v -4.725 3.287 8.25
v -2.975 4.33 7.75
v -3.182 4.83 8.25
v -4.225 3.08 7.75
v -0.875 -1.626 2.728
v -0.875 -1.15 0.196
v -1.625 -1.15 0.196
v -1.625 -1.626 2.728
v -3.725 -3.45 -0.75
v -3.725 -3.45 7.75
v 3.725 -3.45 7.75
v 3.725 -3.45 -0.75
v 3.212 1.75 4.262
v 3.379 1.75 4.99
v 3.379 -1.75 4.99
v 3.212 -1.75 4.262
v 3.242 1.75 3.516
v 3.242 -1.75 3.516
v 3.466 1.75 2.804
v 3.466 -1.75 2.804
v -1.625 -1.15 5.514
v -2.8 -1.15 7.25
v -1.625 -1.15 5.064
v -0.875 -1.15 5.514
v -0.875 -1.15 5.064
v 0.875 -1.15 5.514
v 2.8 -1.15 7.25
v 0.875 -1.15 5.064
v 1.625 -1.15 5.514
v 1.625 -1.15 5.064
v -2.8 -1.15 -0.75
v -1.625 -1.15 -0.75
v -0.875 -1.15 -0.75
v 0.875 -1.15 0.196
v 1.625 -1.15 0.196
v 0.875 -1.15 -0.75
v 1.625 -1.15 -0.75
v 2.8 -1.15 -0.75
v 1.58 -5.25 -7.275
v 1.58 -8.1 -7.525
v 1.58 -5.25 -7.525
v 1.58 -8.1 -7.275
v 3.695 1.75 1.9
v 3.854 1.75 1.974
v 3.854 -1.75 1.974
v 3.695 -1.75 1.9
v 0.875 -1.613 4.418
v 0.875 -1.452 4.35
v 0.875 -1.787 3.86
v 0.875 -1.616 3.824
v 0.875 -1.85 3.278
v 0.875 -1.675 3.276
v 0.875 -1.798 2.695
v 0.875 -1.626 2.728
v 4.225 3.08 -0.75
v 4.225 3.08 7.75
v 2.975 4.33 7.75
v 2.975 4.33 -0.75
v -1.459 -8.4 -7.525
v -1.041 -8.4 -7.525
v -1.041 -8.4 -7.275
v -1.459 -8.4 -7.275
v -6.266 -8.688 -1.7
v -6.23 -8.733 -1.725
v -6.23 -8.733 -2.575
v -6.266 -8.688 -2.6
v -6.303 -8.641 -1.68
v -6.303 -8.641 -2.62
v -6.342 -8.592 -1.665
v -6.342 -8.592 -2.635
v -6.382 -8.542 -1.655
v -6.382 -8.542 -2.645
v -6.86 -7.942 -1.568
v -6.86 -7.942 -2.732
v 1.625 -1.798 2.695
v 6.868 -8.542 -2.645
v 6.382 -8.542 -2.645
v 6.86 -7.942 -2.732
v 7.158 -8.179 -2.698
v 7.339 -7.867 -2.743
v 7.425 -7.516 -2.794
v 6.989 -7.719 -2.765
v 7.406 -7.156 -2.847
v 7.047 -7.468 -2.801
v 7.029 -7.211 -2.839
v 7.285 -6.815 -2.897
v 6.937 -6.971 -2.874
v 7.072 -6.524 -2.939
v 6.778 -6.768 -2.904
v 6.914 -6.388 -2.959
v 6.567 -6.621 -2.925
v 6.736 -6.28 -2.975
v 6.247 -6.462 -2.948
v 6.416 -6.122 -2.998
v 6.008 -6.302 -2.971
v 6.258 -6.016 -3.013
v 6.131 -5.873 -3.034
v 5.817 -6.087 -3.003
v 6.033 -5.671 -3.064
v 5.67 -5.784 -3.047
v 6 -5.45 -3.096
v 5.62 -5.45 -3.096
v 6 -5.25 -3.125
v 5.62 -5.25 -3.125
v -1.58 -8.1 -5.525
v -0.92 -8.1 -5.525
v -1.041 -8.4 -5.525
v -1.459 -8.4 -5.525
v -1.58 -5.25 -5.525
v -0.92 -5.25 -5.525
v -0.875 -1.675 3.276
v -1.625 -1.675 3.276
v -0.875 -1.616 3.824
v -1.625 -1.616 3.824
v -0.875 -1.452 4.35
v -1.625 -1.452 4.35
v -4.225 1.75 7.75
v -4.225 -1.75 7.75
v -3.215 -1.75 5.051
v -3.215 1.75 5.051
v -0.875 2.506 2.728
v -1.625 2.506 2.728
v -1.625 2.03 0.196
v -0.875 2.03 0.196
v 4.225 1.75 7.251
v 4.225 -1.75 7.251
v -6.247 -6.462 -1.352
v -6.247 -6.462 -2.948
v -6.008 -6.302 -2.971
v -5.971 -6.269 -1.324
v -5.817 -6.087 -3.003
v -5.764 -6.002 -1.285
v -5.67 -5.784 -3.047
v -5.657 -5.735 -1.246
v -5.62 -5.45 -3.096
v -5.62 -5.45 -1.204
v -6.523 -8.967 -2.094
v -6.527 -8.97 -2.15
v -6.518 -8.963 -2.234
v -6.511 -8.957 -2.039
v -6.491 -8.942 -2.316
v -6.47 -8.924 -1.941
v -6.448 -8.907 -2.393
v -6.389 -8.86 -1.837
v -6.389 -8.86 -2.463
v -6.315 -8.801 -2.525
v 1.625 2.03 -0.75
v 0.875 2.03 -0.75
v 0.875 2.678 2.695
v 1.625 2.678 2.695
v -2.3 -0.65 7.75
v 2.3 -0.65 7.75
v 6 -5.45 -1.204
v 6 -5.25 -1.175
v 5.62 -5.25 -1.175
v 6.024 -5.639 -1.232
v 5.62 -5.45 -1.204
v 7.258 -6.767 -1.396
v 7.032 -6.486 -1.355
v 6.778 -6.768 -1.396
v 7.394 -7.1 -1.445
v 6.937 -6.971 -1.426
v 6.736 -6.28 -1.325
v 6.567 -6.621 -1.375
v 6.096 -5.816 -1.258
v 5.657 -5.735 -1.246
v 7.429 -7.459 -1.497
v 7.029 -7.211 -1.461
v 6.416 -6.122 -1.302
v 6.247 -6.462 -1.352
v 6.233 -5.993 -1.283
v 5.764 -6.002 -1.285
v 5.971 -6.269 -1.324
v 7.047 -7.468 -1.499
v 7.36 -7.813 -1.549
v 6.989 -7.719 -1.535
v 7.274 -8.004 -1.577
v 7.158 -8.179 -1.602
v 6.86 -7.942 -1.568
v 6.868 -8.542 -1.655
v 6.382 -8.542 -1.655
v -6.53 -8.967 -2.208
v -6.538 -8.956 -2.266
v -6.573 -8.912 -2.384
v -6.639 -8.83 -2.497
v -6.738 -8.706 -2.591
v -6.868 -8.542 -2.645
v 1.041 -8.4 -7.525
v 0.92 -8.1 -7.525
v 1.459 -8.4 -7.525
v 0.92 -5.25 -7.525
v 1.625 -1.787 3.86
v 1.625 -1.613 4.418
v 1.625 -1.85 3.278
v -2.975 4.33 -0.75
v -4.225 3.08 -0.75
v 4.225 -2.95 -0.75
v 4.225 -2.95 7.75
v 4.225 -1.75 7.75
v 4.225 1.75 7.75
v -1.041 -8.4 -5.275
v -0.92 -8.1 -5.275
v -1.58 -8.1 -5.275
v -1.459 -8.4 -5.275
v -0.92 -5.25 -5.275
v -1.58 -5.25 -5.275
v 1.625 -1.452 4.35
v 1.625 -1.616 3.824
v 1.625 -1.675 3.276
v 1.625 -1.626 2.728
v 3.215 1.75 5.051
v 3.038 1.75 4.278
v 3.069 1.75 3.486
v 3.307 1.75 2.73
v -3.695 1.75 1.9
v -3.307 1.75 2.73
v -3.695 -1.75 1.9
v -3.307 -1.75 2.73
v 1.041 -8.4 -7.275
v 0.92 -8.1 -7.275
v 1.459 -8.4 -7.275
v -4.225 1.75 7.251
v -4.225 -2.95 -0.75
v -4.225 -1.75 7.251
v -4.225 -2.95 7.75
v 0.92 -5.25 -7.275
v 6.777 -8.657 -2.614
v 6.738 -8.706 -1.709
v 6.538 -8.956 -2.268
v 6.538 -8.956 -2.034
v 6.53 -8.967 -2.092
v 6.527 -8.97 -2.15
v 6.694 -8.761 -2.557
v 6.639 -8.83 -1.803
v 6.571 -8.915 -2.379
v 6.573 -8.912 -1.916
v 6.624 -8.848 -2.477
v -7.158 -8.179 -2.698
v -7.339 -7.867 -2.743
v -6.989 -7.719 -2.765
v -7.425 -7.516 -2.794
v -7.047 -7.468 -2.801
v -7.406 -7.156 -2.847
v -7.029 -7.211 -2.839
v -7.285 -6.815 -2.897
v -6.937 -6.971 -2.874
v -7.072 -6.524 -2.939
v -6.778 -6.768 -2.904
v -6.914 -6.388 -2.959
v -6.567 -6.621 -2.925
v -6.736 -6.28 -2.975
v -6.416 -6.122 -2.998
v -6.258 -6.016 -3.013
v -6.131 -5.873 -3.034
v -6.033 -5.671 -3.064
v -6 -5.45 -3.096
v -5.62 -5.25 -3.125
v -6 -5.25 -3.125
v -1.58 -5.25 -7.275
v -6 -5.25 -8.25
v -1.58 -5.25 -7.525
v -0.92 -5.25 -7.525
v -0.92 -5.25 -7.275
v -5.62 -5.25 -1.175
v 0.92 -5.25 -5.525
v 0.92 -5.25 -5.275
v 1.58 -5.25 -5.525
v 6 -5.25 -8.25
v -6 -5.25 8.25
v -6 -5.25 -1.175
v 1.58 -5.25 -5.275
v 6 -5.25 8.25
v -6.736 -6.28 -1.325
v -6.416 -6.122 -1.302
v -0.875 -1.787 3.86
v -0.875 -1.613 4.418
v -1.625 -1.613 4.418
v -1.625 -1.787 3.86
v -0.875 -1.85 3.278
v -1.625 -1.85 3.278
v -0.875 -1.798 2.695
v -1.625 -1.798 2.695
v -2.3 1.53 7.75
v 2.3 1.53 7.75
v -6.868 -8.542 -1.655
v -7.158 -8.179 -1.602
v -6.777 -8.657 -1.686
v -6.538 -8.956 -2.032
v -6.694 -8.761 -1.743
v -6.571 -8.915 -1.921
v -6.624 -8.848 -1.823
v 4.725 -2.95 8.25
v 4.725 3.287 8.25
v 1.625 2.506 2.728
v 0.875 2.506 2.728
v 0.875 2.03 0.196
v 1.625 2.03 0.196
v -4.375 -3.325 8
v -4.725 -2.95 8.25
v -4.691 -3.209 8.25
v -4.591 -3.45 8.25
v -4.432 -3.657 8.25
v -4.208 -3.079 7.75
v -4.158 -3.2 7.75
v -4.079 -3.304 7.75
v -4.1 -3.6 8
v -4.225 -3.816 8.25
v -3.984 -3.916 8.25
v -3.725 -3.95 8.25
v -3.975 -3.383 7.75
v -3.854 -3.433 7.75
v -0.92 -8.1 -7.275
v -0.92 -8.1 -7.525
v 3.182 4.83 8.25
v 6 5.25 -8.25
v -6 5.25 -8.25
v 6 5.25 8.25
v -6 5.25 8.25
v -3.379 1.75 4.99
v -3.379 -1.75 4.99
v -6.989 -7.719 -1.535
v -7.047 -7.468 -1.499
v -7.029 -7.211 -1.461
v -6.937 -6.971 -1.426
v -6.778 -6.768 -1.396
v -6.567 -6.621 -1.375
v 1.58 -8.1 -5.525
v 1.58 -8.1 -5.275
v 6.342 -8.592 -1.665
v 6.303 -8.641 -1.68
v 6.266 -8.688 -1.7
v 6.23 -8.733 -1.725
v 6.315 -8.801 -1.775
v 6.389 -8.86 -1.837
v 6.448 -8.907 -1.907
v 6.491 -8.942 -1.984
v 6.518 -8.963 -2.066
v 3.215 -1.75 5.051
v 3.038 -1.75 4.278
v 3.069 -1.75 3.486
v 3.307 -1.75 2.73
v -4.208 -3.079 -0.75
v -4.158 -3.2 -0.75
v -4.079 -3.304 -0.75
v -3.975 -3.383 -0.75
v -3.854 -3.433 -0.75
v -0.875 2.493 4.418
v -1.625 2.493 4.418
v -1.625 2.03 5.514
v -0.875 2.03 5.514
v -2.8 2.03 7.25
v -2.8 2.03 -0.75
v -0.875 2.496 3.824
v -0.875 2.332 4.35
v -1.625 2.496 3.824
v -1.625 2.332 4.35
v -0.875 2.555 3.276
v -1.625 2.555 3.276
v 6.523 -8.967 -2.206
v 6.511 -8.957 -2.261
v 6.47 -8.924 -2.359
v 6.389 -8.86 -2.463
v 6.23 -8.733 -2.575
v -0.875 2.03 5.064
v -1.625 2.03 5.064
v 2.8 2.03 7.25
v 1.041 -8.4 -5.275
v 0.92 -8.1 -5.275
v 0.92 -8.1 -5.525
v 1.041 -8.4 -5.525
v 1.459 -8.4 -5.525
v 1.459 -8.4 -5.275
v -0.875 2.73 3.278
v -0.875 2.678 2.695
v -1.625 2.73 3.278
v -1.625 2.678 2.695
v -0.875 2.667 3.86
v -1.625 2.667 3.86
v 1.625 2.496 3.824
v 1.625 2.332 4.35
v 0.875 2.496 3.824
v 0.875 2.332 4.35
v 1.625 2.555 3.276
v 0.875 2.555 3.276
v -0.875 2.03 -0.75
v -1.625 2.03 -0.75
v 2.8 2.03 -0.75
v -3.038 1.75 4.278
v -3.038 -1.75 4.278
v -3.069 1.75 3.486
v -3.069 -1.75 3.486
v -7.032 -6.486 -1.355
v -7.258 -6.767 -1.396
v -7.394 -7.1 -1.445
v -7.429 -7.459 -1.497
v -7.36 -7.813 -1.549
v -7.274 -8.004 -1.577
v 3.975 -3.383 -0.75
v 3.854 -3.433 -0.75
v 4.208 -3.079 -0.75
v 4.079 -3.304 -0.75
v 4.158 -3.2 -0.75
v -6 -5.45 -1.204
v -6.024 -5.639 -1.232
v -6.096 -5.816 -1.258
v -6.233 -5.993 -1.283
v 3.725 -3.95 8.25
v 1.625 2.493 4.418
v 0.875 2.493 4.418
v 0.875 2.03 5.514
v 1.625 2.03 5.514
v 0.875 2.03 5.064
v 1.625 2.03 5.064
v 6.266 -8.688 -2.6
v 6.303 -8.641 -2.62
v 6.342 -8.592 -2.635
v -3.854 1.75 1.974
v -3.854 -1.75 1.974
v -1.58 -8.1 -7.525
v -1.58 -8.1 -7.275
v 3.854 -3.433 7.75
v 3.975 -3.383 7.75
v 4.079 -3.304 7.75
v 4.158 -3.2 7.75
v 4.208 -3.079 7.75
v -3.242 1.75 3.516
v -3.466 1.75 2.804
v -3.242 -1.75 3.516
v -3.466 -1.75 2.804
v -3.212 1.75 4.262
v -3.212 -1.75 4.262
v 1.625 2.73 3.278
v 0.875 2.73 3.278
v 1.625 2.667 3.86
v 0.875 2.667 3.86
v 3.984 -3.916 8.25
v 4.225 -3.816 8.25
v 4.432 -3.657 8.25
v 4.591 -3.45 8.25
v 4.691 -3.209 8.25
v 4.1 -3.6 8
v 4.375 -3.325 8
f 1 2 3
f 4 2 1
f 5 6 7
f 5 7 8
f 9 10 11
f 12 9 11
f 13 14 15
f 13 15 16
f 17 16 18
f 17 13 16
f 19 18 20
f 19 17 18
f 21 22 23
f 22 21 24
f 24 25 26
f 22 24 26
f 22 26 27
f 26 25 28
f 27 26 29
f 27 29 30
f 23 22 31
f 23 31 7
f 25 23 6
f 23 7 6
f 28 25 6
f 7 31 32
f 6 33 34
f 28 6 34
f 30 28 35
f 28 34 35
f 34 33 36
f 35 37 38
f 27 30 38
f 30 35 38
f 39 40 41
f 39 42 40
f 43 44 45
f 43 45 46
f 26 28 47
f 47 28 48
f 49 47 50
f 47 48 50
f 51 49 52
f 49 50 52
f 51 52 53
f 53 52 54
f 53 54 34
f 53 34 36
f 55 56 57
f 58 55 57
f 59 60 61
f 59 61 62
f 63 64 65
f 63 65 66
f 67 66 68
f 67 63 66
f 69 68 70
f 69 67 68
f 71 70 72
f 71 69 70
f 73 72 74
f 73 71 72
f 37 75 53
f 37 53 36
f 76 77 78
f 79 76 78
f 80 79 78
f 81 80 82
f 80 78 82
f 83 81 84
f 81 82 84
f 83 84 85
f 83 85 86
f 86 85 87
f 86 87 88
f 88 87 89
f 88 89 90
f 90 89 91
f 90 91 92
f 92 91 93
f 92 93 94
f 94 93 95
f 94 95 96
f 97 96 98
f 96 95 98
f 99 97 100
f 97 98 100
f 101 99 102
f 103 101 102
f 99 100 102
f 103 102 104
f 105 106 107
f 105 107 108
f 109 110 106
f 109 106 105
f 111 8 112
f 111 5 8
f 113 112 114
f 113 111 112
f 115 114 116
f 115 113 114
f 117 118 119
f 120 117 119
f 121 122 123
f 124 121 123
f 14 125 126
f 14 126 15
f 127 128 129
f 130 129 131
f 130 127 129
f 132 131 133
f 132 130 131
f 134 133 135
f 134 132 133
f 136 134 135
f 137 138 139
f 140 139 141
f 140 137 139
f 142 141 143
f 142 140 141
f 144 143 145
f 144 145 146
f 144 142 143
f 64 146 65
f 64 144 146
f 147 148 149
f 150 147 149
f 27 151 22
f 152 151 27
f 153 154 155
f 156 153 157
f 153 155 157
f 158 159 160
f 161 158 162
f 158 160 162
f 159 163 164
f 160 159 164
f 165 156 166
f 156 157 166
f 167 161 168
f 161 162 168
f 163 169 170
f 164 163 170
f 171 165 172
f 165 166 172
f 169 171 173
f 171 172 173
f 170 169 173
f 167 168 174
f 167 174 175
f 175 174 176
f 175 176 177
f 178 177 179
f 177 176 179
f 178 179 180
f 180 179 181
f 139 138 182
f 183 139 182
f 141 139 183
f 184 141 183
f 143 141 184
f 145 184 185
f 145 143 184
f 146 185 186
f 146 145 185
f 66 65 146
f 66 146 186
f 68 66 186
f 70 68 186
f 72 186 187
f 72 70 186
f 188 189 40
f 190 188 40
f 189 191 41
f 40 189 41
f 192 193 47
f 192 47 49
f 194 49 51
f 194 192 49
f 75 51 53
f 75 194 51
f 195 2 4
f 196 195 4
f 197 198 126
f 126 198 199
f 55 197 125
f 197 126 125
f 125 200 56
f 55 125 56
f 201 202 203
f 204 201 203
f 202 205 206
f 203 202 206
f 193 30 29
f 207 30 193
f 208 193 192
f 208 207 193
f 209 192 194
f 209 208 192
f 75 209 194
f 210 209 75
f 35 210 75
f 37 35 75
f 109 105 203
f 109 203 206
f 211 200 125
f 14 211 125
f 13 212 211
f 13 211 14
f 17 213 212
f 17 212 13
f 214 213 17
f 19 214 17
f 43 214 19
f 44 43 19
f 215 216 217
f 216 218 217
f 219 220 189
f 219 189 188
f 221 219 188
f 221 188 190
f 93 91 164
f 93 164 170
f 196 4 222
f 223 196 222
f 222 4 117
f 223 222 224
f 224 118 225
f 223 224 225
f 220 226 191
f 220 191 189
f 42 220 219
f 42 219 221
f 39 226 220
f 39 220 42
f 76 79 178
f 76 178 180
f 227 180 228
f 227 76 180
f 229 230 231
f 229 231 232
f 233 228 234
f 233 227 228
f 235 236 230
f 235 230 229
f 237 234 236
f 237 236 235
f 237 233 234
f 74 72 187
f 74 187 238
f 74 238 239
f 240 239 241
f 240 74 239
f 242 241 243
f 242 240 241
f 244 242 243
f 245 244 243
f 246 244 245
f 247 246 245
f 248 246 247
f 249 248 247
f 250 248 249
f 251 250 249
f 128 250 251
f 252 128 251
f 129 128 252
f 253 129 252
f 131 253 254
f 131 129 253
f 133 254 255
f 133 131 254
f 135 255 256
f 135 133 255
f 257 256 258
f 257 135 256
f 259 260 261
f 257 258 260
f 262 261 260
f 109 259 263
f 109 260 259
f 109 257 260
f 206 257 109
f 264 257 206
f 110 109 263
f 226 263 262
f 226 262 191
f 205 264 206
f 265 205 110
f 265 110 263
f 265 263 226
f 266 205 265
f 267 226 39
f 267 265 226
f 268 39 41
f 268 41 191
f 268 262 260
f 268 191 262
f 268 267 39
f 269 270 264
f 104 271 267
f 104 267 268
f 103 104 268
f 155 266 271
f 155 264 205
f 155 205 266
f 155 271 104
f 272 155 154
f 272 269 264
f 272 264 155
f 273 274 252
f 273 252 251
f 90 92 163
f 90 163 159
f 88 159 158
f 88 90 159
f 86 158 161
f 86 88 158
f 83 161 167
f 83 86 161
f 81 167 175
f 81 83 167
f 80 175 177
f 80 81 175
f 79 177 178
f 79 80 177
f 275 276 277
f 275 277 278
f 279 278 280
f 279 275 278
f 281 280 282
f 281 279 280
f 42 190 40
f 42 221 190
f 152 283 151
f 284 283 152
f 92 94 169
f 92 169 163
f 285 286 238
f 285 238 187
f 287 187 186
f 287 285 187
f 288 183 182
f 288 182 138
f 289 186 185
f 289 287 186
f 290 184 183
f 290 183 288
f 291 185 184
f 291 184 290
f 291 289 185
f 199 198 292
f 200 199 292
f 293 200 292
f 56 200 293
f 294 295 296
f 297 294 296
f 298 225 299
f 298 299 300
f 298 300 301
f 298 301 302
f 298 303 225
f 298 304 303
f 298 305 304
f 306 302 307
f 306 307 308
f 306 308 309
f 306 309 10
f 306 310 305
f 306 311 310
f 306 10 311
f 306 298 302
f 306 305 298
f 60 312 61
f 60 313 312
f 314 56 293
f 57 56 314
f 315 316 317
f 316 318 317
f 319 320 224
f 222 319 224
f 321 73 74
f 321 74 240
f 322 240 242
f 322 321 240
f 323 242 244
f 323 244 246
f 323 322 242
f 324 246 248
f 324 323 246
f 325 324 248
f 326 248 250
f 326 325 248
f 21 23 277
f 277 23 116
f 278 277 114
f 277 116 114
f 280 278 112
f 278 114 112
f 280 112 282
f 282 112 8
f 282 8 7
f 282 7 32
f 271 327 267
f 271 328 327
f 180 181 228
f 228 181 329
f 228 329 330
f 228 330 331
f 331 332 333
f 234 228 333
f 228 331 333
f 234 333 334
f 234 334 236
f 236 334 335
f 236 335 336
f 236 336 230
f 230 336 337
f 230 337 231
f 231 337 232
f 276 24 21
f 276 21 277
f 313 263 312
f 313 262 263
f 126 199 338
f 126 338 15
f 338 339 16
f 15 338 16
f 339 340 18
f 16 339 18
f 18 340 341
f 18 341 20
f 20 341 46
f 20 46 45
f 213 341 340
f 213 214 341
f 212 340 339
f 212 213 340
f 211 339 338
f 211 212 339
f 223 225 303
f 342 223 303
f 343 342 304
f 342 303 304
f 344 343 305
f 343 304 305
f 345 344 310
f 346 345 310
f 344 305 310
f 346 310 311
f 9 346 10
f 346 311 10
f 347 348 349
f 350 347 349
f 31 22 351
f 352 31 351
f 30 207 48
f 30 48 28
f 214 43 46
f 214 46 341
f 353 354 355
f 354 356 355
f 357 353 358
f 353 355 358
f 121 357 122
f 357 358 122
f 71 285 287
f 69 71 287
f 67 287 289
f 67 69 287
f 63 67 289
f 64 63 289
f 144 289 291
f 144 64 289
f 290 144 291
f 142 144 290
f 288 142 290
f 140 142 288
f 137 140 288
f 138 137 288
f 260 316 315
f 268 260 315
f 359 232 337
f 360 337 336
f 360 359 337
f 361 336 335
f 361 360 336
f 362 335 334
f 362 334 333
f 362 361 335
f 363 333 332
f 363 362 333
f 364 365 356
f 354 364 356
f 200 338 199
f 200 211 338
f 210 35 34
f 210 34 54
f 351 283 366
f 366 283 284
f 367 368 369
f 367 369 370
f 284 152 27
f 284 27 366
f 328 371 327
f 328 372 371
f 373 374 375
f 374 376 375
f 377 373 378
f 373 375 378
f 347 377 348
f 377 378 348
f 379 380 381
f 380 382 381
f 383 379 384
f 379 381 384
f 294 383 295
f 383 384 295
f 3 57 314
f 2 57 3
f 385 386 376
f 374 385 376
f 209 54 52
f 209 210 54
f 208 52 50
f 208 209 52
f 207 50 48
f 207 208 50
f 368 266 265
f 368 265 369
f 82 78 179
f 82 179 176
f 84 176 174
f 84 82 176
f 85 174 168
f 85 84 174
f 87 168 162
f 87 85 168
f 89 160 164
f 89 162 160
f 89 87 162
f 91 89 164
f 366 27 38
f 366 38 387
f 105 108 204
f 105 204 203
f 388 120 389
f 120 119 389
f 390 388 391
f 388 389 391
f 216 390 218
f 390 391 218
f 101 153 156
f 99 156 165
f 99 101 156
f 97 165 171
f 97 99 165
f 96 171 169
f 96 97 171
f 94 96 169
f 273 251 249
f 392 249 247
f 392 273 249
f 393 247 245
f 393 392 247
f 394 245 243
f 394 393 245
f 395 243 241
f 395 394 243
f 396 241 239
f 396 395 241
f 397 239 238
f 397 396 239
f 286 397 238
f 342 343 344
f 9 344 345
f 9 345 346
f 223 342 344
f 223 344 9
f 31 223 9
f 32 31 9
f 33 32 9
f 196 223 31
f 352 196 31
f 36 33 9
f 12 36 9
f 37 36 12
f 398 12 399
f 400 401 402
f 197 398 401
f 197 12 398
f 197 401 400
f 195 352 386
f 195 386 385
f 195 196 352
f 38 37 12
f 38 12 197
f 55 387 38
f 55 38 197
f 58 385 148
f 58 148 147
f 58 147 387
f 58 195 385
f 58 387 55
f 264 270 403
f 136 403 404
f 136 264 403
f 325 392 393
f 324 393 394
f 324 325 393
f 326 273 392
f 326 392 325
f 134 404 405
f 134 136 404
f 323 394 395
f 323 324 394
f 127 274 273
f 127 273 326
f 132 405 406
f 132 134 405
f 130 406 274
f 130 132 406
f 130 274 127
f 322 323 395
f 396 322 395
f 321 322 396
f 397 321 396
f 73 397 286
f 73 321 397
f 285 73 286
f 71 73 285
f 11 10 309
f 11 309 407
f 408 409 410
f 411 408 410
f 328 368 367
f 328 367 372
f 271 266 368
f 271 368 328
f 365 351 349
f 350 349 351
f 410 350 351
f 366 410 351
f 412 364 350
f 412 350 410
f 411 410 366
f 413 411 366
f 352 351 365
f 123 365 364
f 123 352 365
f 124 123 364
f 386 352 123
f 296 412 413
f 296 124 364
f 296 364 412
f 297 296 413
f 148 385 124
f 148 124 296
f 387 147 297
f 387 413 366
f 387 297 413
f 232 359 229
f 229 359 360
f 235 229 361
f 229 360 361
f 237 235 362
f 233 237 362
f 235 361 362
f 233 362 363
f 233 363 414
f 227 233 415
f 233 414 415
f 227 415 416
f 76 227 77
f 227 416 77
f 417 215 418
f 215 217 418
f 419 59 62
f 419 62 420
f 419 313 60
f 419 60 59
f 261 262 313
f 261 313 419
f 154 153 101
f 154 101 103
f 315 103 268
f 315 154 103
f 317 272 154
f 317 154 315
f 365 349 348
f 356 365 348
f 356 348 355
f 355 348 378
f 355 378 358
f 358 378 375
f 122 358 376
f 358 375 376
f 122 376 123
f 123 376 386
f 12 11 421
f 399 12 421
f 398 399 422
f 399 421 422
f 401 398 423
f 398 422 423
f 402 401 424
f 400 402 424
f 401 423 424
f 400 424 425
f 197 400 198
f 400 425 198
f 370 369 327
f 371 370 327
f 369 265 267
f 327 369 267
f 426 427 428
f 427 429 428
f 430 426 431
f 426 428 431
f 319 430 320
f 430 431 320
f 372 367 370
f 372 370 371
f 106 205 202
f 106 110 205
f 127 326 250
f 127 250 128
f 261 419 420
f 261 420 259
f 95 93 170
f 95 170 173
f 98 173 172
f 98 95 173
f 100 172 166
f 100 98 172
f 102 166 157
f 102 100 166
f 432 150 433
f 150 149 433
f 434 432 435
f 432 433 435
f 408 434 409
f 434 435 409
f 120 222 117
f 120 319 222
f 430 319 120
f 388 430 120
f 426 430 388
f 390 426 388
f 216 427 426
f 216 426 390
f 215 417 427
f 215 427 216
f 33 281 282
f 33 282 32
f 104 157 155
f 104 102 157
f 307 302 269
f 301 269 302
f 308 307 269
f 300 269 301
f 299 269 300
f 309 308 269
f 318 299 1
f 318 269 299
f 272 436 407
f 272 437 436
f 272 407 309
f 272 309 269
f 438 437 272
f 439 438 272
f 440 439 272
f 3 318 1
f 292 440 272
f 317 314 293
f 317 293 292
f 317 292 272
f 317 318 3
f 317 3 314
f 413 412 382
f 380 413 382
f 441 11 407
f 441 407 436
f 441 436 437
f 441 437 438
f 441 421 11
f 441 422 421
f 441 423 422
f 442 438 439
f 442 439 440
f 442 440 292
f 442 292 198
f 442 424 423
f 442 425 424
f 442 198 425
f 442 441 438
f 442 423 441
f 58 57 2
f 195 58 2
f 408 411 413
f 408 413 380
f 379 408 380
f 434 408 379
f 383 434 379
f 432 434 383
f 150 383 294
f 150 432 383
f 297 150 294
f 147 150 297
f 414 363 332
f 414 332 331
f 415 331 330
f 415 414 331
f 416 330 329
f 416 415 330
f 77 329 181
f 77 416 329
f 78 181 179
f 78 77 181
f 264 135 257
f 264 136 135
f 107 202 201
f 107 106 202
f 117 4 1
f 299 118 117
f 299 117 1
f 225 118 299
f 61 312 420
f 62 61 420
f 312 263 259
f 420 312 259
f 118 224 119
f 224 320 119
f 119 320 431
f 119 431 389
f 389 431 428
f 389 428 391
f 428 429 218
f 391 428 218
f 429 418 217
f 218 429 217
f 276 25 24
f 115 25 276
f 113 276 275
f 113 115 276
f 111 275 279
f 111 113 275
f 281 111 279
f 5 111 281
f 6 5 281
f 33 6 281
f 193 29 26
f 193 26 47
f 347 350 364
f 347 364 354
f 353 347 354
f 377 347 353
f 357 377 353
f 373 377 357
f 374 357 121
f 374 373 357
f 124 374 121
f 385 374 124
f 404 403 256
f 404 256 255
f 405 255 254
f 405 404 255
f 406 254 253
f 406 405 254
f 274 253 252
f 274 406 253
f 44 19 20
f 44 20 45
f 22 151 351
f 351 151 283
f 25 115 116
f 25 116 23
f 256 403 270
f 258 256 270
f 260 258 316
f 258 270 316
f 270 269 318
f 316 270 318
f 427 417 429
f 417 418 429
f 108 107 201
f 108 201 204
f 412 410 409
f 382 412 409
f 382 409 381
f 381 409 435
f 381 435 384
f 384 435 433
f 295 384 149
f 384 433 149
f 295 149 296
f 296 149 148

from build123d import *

# Parameters (mm, degrees)
SKETCH1_W                      = 12
SKETCH1_H                      = 10.5
BASE_DEPTH                     = 8.25
CONTACT_OPENING_DEPTH          = 9
CONTACT_OPENING_LEAD_IN_SIZE   = 0.5
SKETCH3_W                      = 5.6
SKETCH3_H                      = 3.18
CONTACT_AREA_DEPTH             = 8.5
CONTACT_AREA_LEAD_IN_SIZE      = 0.5
HOLDING_TINES_DEPTH            = 1.75
CONTACT_DEPTH                  = 0.375
CONTACT_PATTERN_COUNT          = 2
CONTACT_PATTERN_PITCH          = 2.5
TH_GROUND_LEGS_DEPTH           = 0.975
TH_GROUND_LEG_SHAPE_DEPTH      = 8.43
TH_GROUND_LEG_SHAPE_DEPTH_BACK = 8.43
TH_TAILS_DEPTH                 = 0.125
TH_TAILS_PATTERN_COUNT         = 2
TH_TAILS_PATTERN_PITCH         = 2


with BuildPart() as part:
    # Sketch1 → Base (new body, symmetric)
    with BuildSketch(Plane.XY):
        Rectangle(SKETCH1_W, SKETCH1_H)
    extrude(amount=BASE_DEPTH, both=True)

    # Sketch2 → Contact Opening (cut)
    with BuildSketch(Plane.XY.offset(8.25)):
        with BuildLine():
            Line((-2.975, 4.33), (-4.225, 3.08))
            Line((-4.225, 3.08), (-4.225, -2.95))
            ThreePointArc((-4.225, -2.95), (-4.078553391, -3.303553391), (-3.725, -3.45))
            Line((-3.725, -3.45), (3.725, -3.45))
            ThreePointArc((3.725, -3.45), (4.078553391, -3.303553391), (4.225, -2.95))
            Line((4.225, -2.95), (4.225, 3.08))
            Line((4.225, 3.08), (2.975, 4.33))
            Line((2.975, 4.33), (-2.975, 4.33))
        make_face()
    extrude(amount=-CONTACT_OPENING_DEPTH, mode=Mode.SUBTRACT)

    # Contact Opening Lead-in
    contact_opening_lead_in_edges = [part.edges().sort_by_distance(p)[0] for p in [
        (0, 4.33, 8.25),
        (-3.6, 3.705, 8.25),
        (-4.225, 0.065, 8.25),
        (-4.078553391, -3.303553391, 8.25),
        (0, -3.45, 8.25),
        (4.078553391, -3.303553391, 8.25),
        (4.225, 0.065, 8.25),
        (3.6, 3.705, 8.25),
    ]]
    chamfer(contact_opening_lead_in_edges, length=CONTACT_OPENING_LEAD_IN_SIZE)

    # Sketch3 → Contact Area (add)
    with BuildSketch(Plane.XY.offset(-0.75)):
        with Locations((0, 0.44)):
            Rectangle(SKETCH3_W, SKETCH3_H)
    extrude(amount=CONTACT_AREA_DEPTH)

    # Contact Area Lead-in
    contact_area_lead_in_edges = [part.edges().sort_by_distance(p)[0] for p in [
        (-2.8, 0.44, 7.75),
        (0, -1.15, 7.75),
        (2.8, 0.44, 7.75),
        (0, 2.03, 7.75),
    ]]
    chamfer(contact_area_lead_in_edges, length=CONTACT_AREA_LEAD_IN_SIZE)

    # Sketch7 → Holding Tines (add, symmetric)
    with BuildSketch(Plane(origin=(0, 0, 0), x_dir=(1, 0, 0), z_dir=(0, 1, 0))):
        with BuildLine():
            Line((-4.225, -7.75), (-3.215243234, -5.051316752))
            ThreePointArc((-3.215243234, -5.051316752), (-3.027350135, -3.881276433), (-3.307189725, -2.729760924))
            Line((-3.307189725, -2.729760924), (-3.695, -1.9))
            Line((-3.695, -1.9), (-3.853538933, -1.974097279))
            Line((-3.853538933, -1.974097279), (-3.465728658, -2.803858203))
            ThreePointArc((-3.465728658, -2.803858203), (-3.202213044, -3.888201975), (-3.379145712, -4.989989942))
            Line((-3.379145712, -4.989989942), (-4.388902478, -7.688673189))
            Line((-4.388902478, -7.688673189), (-4.225, -7.75))
        make_face()
        with BuildLine():
            Line((4.225, -7.75), (4.388902478, -7.688673189))
            Line((4.388902478, -7.688673189), (3.379145712, -4.989989942))
            ThreePointArc((3.379145712, -4.989989942), (3.202213044, -3.888201975), (3.465728658, -2.803858203))
            Line((3.465728658, -2.803858203), (3.853538933, -1.974097279))
            Line((3.853538933, -1.974097279), (3.695, -1.9))
            Line((3.695, -1.9), (3.307189725, -2.729760924))
            ThreePointArc((3.307189725, -2.729760924), (3.027350135, -3.881276433), (3.215243234, -5.051316752))
            Line((3.215243234, -5.051316752), (4.225, -7.75))
        make_face()
    extrude(amount=HOLDING_TINES_DEPTH, both=True)

    # Sketch8 → Contact (add, symmetric)
    with BuildSketch(Plane(origin=(-1.25, 0, 0), x_dir=(0, 0, -1), z_dir=(1, 0, 0))):
        with BuildLine():
            Line((0.75, 2.03), (-2.695251124, 2.678262825))
            ThreePointArc((-2.695251124, 2.678262825), (-3.57053143, 2.712827451), (-4.418484282, 2.493086043))
            Line((-4.418484282, 2.493086043), (-5.75, 1.93))
            Line((-5.75, 1.93), (-5.681838417, 1.768819981))
            Line((-5.681838417, 1.768819981), (-4.350322699, 2.331906024))
            ThreePointArc((-4.350322699, 2.331906024), (-3.551833763, 2.538829183), (-2.727611475, 2.506280827))
            Line((-2.727611475, 2.506280827), (0.717639649, 1.858018002))
            Line((0.717639649, 1.858018002), (0.75, 2.03))
        make_face()
        with BuildLine():
            Line((-5.681838417, -0.888819981), (-5.75, -1.05))
            Line((-5.75, -1.05), (-4.418484282, -1.613086043))
            ThreePointArc((-4.418484282, -1.613086043), (-3.57053143, -1.832827451), (-2.695251124, -1.798262825))
            Line((-2.695251124, -1.798262825), (0.75, -1.15))
            Line((0.75, -1.15), (0.717639649, -0.978018002))
            Line((0.717639649, -0.978018002), (-2.727611475, -1.626280827))
            ThreePointArc((-2.727611475, -1.626280827), (-3.551833763, -1.658829183), (-4.350322699, -1.451906024))
            Line((-4.350322699, -1.451906024), (-5.681838417, -0.888819981))
        make_face()
    contact = extrude(amount=CONTACT_DEPTH, both=True)

    # Contact Pattern: Contact ×2
    with Locations(*[(i * CONTACT_PATTERN_PITCH, 0, 0) for i in range(1, CONTACT_PATTERN_COUNT)]):
        add(contact)

    # Sketch13 → TH Ground Legs (add, symmetric)
    with BuildSketch(Plane.XY.offset(-2.15)):
        with BuildLine():
            Line((6, -5.25), (6, -5.45))
            ThreePointArc((6, -5.45), (6.112536174, -5.84514538), (6.41637299, -6.121709028))
            Line((6.41637299, -6.121709028), (6.736045017, -6.280484954))
            ThreePointArc((6.736045017, -6.280484954), (7.400291967, -7.129098698), (7.157524757, -8.179066973))
            Line((7.157524757, -8.179066973), (6.527167526, -8.97))
            Line((6.527167526, -8.97), (6.23, -8.73316364))
            Line((6.23, -8.73316364), (6.860357231, -7.942230613))
            ThreePointArc((6.860357231, -7.942230613), (7.029323209, -7.211452694), (6.567007332, -6.620817528))
            Line((6.567007332, -6.620817528), (6.247335304, -6.462041602))
            ThreePointArc((6.247335304, -6.462041602), (5.789554503, -6.045352372), (5.62, -5.45))
            Line((5.62, -5.45), (5.62, -5.25))
            Line((5.62, -5.25), (6, -5.25))
        make_face()
        with BuildLine():
            Line((-5.62, -5.25), (-6, -5.25))
            Line((-6, -5.25), (-6, -5.45))
            ThreePointArc((-6, -5.45), (-6.112536174, -5.84514538), (-6.41637299, -6.121709028))
            Line((-6.41637299, -6.121709028), (-6.736045017, -6.280484954))
            ThreePointArc((-6.736045017, -6.280484954), (-7.400291967, -7.129098698), (-7.157524757, -8.179066973))
            Line((-7.157524757, -8.179066973), (-6.527167526, -8.97))
            Line((-6.527167526, -8.97), (-6.23, -8.73316364))
            Line((-6.23, -8.73316364), (-6.860357231, -7.942230613))
            ThreePointArc((-6.860357231, -7.942230613), (-7.029323209, -7.211452694), (-6.567007332, -6.620817528))
            Line((-6.567007332, -6.620817528), (-6.247335304, -6.462041602))
            ThreePointArc((-6.247335304, -6.462041602), (-5.789554503, -6.045352372), (-5.62, -5.45))
            Line((-5.62, -5.45), (-5.62, -5.25))
        make_face()
    extrude(amount=TH_GROUND_LEGS_DEPTH, both=True)

    # Sketch14 → TH Ground Leg Shape (cut, two sides)
    with BuildSketch(Plane(origin=(0, 0, 0), x_dir=(0, 0, -1), z_dir=(1, 0, 0))) as th_ground_leg_shape_sk:
        with BuildLine():
            Line((3.125, -5.25), (3.125, -9))
            Line((3.125, -9), (1.175, -9))
            Line((1.175, -9), (1.175, -5.25))
            Line((1.175, -5.25), (1.655236252, -8.542172253))
            ThreePointArc((1.655236252, -8.542172253), (2.15, -8.97), (2.644763748, -8.542172253))
            Line((2.644763748, -8.542172253), (3.125, -5.25))
        make_face()
    extrude(amount=TH_GROUND_LEG_SHAPE_DEPTH, mode=Mode.SUBTRACT)
    extrude(th_ground_leg_shape_sk.sketch, amount=-TH_GROUND_LEG_SHAPE_DEPTH_BACK, mode=Mode.SUBTRACT)

    # Sketch15 → TH Tails (add, symmetric)
    with BuildSketch(Plane(origin=(0, 0, -7.4), x_dir=(-1, 0, 0), z_dir=(0, 0, -1))):
        Polygon((-1.58, -5.25), (-0.92, -5.25), (-0.92, -8.1), (-1.041207868, -8.4), (-1.458792132, -8.4), (-1.58, -8.1), align=None)
        Polygon((0.92, -8.1), (1.041207868, -8.4), (1.458792132, -8.4), (1.58, -8.1), (1.58, -5.25), (0.92, -5.25), align=None)
    th_tails = extrude(amount=TH_TAILS_DEPTH, both=True)

    # TH Tails Pattern: TH Tails ×2
    with Locations(*[(0, 0, i * TH_TAILS_PATTERN_PITCH) for i in range(1, TH_TAILS_PATTERN_COUNT)]):
        add(th_tails)


solid = part.part
